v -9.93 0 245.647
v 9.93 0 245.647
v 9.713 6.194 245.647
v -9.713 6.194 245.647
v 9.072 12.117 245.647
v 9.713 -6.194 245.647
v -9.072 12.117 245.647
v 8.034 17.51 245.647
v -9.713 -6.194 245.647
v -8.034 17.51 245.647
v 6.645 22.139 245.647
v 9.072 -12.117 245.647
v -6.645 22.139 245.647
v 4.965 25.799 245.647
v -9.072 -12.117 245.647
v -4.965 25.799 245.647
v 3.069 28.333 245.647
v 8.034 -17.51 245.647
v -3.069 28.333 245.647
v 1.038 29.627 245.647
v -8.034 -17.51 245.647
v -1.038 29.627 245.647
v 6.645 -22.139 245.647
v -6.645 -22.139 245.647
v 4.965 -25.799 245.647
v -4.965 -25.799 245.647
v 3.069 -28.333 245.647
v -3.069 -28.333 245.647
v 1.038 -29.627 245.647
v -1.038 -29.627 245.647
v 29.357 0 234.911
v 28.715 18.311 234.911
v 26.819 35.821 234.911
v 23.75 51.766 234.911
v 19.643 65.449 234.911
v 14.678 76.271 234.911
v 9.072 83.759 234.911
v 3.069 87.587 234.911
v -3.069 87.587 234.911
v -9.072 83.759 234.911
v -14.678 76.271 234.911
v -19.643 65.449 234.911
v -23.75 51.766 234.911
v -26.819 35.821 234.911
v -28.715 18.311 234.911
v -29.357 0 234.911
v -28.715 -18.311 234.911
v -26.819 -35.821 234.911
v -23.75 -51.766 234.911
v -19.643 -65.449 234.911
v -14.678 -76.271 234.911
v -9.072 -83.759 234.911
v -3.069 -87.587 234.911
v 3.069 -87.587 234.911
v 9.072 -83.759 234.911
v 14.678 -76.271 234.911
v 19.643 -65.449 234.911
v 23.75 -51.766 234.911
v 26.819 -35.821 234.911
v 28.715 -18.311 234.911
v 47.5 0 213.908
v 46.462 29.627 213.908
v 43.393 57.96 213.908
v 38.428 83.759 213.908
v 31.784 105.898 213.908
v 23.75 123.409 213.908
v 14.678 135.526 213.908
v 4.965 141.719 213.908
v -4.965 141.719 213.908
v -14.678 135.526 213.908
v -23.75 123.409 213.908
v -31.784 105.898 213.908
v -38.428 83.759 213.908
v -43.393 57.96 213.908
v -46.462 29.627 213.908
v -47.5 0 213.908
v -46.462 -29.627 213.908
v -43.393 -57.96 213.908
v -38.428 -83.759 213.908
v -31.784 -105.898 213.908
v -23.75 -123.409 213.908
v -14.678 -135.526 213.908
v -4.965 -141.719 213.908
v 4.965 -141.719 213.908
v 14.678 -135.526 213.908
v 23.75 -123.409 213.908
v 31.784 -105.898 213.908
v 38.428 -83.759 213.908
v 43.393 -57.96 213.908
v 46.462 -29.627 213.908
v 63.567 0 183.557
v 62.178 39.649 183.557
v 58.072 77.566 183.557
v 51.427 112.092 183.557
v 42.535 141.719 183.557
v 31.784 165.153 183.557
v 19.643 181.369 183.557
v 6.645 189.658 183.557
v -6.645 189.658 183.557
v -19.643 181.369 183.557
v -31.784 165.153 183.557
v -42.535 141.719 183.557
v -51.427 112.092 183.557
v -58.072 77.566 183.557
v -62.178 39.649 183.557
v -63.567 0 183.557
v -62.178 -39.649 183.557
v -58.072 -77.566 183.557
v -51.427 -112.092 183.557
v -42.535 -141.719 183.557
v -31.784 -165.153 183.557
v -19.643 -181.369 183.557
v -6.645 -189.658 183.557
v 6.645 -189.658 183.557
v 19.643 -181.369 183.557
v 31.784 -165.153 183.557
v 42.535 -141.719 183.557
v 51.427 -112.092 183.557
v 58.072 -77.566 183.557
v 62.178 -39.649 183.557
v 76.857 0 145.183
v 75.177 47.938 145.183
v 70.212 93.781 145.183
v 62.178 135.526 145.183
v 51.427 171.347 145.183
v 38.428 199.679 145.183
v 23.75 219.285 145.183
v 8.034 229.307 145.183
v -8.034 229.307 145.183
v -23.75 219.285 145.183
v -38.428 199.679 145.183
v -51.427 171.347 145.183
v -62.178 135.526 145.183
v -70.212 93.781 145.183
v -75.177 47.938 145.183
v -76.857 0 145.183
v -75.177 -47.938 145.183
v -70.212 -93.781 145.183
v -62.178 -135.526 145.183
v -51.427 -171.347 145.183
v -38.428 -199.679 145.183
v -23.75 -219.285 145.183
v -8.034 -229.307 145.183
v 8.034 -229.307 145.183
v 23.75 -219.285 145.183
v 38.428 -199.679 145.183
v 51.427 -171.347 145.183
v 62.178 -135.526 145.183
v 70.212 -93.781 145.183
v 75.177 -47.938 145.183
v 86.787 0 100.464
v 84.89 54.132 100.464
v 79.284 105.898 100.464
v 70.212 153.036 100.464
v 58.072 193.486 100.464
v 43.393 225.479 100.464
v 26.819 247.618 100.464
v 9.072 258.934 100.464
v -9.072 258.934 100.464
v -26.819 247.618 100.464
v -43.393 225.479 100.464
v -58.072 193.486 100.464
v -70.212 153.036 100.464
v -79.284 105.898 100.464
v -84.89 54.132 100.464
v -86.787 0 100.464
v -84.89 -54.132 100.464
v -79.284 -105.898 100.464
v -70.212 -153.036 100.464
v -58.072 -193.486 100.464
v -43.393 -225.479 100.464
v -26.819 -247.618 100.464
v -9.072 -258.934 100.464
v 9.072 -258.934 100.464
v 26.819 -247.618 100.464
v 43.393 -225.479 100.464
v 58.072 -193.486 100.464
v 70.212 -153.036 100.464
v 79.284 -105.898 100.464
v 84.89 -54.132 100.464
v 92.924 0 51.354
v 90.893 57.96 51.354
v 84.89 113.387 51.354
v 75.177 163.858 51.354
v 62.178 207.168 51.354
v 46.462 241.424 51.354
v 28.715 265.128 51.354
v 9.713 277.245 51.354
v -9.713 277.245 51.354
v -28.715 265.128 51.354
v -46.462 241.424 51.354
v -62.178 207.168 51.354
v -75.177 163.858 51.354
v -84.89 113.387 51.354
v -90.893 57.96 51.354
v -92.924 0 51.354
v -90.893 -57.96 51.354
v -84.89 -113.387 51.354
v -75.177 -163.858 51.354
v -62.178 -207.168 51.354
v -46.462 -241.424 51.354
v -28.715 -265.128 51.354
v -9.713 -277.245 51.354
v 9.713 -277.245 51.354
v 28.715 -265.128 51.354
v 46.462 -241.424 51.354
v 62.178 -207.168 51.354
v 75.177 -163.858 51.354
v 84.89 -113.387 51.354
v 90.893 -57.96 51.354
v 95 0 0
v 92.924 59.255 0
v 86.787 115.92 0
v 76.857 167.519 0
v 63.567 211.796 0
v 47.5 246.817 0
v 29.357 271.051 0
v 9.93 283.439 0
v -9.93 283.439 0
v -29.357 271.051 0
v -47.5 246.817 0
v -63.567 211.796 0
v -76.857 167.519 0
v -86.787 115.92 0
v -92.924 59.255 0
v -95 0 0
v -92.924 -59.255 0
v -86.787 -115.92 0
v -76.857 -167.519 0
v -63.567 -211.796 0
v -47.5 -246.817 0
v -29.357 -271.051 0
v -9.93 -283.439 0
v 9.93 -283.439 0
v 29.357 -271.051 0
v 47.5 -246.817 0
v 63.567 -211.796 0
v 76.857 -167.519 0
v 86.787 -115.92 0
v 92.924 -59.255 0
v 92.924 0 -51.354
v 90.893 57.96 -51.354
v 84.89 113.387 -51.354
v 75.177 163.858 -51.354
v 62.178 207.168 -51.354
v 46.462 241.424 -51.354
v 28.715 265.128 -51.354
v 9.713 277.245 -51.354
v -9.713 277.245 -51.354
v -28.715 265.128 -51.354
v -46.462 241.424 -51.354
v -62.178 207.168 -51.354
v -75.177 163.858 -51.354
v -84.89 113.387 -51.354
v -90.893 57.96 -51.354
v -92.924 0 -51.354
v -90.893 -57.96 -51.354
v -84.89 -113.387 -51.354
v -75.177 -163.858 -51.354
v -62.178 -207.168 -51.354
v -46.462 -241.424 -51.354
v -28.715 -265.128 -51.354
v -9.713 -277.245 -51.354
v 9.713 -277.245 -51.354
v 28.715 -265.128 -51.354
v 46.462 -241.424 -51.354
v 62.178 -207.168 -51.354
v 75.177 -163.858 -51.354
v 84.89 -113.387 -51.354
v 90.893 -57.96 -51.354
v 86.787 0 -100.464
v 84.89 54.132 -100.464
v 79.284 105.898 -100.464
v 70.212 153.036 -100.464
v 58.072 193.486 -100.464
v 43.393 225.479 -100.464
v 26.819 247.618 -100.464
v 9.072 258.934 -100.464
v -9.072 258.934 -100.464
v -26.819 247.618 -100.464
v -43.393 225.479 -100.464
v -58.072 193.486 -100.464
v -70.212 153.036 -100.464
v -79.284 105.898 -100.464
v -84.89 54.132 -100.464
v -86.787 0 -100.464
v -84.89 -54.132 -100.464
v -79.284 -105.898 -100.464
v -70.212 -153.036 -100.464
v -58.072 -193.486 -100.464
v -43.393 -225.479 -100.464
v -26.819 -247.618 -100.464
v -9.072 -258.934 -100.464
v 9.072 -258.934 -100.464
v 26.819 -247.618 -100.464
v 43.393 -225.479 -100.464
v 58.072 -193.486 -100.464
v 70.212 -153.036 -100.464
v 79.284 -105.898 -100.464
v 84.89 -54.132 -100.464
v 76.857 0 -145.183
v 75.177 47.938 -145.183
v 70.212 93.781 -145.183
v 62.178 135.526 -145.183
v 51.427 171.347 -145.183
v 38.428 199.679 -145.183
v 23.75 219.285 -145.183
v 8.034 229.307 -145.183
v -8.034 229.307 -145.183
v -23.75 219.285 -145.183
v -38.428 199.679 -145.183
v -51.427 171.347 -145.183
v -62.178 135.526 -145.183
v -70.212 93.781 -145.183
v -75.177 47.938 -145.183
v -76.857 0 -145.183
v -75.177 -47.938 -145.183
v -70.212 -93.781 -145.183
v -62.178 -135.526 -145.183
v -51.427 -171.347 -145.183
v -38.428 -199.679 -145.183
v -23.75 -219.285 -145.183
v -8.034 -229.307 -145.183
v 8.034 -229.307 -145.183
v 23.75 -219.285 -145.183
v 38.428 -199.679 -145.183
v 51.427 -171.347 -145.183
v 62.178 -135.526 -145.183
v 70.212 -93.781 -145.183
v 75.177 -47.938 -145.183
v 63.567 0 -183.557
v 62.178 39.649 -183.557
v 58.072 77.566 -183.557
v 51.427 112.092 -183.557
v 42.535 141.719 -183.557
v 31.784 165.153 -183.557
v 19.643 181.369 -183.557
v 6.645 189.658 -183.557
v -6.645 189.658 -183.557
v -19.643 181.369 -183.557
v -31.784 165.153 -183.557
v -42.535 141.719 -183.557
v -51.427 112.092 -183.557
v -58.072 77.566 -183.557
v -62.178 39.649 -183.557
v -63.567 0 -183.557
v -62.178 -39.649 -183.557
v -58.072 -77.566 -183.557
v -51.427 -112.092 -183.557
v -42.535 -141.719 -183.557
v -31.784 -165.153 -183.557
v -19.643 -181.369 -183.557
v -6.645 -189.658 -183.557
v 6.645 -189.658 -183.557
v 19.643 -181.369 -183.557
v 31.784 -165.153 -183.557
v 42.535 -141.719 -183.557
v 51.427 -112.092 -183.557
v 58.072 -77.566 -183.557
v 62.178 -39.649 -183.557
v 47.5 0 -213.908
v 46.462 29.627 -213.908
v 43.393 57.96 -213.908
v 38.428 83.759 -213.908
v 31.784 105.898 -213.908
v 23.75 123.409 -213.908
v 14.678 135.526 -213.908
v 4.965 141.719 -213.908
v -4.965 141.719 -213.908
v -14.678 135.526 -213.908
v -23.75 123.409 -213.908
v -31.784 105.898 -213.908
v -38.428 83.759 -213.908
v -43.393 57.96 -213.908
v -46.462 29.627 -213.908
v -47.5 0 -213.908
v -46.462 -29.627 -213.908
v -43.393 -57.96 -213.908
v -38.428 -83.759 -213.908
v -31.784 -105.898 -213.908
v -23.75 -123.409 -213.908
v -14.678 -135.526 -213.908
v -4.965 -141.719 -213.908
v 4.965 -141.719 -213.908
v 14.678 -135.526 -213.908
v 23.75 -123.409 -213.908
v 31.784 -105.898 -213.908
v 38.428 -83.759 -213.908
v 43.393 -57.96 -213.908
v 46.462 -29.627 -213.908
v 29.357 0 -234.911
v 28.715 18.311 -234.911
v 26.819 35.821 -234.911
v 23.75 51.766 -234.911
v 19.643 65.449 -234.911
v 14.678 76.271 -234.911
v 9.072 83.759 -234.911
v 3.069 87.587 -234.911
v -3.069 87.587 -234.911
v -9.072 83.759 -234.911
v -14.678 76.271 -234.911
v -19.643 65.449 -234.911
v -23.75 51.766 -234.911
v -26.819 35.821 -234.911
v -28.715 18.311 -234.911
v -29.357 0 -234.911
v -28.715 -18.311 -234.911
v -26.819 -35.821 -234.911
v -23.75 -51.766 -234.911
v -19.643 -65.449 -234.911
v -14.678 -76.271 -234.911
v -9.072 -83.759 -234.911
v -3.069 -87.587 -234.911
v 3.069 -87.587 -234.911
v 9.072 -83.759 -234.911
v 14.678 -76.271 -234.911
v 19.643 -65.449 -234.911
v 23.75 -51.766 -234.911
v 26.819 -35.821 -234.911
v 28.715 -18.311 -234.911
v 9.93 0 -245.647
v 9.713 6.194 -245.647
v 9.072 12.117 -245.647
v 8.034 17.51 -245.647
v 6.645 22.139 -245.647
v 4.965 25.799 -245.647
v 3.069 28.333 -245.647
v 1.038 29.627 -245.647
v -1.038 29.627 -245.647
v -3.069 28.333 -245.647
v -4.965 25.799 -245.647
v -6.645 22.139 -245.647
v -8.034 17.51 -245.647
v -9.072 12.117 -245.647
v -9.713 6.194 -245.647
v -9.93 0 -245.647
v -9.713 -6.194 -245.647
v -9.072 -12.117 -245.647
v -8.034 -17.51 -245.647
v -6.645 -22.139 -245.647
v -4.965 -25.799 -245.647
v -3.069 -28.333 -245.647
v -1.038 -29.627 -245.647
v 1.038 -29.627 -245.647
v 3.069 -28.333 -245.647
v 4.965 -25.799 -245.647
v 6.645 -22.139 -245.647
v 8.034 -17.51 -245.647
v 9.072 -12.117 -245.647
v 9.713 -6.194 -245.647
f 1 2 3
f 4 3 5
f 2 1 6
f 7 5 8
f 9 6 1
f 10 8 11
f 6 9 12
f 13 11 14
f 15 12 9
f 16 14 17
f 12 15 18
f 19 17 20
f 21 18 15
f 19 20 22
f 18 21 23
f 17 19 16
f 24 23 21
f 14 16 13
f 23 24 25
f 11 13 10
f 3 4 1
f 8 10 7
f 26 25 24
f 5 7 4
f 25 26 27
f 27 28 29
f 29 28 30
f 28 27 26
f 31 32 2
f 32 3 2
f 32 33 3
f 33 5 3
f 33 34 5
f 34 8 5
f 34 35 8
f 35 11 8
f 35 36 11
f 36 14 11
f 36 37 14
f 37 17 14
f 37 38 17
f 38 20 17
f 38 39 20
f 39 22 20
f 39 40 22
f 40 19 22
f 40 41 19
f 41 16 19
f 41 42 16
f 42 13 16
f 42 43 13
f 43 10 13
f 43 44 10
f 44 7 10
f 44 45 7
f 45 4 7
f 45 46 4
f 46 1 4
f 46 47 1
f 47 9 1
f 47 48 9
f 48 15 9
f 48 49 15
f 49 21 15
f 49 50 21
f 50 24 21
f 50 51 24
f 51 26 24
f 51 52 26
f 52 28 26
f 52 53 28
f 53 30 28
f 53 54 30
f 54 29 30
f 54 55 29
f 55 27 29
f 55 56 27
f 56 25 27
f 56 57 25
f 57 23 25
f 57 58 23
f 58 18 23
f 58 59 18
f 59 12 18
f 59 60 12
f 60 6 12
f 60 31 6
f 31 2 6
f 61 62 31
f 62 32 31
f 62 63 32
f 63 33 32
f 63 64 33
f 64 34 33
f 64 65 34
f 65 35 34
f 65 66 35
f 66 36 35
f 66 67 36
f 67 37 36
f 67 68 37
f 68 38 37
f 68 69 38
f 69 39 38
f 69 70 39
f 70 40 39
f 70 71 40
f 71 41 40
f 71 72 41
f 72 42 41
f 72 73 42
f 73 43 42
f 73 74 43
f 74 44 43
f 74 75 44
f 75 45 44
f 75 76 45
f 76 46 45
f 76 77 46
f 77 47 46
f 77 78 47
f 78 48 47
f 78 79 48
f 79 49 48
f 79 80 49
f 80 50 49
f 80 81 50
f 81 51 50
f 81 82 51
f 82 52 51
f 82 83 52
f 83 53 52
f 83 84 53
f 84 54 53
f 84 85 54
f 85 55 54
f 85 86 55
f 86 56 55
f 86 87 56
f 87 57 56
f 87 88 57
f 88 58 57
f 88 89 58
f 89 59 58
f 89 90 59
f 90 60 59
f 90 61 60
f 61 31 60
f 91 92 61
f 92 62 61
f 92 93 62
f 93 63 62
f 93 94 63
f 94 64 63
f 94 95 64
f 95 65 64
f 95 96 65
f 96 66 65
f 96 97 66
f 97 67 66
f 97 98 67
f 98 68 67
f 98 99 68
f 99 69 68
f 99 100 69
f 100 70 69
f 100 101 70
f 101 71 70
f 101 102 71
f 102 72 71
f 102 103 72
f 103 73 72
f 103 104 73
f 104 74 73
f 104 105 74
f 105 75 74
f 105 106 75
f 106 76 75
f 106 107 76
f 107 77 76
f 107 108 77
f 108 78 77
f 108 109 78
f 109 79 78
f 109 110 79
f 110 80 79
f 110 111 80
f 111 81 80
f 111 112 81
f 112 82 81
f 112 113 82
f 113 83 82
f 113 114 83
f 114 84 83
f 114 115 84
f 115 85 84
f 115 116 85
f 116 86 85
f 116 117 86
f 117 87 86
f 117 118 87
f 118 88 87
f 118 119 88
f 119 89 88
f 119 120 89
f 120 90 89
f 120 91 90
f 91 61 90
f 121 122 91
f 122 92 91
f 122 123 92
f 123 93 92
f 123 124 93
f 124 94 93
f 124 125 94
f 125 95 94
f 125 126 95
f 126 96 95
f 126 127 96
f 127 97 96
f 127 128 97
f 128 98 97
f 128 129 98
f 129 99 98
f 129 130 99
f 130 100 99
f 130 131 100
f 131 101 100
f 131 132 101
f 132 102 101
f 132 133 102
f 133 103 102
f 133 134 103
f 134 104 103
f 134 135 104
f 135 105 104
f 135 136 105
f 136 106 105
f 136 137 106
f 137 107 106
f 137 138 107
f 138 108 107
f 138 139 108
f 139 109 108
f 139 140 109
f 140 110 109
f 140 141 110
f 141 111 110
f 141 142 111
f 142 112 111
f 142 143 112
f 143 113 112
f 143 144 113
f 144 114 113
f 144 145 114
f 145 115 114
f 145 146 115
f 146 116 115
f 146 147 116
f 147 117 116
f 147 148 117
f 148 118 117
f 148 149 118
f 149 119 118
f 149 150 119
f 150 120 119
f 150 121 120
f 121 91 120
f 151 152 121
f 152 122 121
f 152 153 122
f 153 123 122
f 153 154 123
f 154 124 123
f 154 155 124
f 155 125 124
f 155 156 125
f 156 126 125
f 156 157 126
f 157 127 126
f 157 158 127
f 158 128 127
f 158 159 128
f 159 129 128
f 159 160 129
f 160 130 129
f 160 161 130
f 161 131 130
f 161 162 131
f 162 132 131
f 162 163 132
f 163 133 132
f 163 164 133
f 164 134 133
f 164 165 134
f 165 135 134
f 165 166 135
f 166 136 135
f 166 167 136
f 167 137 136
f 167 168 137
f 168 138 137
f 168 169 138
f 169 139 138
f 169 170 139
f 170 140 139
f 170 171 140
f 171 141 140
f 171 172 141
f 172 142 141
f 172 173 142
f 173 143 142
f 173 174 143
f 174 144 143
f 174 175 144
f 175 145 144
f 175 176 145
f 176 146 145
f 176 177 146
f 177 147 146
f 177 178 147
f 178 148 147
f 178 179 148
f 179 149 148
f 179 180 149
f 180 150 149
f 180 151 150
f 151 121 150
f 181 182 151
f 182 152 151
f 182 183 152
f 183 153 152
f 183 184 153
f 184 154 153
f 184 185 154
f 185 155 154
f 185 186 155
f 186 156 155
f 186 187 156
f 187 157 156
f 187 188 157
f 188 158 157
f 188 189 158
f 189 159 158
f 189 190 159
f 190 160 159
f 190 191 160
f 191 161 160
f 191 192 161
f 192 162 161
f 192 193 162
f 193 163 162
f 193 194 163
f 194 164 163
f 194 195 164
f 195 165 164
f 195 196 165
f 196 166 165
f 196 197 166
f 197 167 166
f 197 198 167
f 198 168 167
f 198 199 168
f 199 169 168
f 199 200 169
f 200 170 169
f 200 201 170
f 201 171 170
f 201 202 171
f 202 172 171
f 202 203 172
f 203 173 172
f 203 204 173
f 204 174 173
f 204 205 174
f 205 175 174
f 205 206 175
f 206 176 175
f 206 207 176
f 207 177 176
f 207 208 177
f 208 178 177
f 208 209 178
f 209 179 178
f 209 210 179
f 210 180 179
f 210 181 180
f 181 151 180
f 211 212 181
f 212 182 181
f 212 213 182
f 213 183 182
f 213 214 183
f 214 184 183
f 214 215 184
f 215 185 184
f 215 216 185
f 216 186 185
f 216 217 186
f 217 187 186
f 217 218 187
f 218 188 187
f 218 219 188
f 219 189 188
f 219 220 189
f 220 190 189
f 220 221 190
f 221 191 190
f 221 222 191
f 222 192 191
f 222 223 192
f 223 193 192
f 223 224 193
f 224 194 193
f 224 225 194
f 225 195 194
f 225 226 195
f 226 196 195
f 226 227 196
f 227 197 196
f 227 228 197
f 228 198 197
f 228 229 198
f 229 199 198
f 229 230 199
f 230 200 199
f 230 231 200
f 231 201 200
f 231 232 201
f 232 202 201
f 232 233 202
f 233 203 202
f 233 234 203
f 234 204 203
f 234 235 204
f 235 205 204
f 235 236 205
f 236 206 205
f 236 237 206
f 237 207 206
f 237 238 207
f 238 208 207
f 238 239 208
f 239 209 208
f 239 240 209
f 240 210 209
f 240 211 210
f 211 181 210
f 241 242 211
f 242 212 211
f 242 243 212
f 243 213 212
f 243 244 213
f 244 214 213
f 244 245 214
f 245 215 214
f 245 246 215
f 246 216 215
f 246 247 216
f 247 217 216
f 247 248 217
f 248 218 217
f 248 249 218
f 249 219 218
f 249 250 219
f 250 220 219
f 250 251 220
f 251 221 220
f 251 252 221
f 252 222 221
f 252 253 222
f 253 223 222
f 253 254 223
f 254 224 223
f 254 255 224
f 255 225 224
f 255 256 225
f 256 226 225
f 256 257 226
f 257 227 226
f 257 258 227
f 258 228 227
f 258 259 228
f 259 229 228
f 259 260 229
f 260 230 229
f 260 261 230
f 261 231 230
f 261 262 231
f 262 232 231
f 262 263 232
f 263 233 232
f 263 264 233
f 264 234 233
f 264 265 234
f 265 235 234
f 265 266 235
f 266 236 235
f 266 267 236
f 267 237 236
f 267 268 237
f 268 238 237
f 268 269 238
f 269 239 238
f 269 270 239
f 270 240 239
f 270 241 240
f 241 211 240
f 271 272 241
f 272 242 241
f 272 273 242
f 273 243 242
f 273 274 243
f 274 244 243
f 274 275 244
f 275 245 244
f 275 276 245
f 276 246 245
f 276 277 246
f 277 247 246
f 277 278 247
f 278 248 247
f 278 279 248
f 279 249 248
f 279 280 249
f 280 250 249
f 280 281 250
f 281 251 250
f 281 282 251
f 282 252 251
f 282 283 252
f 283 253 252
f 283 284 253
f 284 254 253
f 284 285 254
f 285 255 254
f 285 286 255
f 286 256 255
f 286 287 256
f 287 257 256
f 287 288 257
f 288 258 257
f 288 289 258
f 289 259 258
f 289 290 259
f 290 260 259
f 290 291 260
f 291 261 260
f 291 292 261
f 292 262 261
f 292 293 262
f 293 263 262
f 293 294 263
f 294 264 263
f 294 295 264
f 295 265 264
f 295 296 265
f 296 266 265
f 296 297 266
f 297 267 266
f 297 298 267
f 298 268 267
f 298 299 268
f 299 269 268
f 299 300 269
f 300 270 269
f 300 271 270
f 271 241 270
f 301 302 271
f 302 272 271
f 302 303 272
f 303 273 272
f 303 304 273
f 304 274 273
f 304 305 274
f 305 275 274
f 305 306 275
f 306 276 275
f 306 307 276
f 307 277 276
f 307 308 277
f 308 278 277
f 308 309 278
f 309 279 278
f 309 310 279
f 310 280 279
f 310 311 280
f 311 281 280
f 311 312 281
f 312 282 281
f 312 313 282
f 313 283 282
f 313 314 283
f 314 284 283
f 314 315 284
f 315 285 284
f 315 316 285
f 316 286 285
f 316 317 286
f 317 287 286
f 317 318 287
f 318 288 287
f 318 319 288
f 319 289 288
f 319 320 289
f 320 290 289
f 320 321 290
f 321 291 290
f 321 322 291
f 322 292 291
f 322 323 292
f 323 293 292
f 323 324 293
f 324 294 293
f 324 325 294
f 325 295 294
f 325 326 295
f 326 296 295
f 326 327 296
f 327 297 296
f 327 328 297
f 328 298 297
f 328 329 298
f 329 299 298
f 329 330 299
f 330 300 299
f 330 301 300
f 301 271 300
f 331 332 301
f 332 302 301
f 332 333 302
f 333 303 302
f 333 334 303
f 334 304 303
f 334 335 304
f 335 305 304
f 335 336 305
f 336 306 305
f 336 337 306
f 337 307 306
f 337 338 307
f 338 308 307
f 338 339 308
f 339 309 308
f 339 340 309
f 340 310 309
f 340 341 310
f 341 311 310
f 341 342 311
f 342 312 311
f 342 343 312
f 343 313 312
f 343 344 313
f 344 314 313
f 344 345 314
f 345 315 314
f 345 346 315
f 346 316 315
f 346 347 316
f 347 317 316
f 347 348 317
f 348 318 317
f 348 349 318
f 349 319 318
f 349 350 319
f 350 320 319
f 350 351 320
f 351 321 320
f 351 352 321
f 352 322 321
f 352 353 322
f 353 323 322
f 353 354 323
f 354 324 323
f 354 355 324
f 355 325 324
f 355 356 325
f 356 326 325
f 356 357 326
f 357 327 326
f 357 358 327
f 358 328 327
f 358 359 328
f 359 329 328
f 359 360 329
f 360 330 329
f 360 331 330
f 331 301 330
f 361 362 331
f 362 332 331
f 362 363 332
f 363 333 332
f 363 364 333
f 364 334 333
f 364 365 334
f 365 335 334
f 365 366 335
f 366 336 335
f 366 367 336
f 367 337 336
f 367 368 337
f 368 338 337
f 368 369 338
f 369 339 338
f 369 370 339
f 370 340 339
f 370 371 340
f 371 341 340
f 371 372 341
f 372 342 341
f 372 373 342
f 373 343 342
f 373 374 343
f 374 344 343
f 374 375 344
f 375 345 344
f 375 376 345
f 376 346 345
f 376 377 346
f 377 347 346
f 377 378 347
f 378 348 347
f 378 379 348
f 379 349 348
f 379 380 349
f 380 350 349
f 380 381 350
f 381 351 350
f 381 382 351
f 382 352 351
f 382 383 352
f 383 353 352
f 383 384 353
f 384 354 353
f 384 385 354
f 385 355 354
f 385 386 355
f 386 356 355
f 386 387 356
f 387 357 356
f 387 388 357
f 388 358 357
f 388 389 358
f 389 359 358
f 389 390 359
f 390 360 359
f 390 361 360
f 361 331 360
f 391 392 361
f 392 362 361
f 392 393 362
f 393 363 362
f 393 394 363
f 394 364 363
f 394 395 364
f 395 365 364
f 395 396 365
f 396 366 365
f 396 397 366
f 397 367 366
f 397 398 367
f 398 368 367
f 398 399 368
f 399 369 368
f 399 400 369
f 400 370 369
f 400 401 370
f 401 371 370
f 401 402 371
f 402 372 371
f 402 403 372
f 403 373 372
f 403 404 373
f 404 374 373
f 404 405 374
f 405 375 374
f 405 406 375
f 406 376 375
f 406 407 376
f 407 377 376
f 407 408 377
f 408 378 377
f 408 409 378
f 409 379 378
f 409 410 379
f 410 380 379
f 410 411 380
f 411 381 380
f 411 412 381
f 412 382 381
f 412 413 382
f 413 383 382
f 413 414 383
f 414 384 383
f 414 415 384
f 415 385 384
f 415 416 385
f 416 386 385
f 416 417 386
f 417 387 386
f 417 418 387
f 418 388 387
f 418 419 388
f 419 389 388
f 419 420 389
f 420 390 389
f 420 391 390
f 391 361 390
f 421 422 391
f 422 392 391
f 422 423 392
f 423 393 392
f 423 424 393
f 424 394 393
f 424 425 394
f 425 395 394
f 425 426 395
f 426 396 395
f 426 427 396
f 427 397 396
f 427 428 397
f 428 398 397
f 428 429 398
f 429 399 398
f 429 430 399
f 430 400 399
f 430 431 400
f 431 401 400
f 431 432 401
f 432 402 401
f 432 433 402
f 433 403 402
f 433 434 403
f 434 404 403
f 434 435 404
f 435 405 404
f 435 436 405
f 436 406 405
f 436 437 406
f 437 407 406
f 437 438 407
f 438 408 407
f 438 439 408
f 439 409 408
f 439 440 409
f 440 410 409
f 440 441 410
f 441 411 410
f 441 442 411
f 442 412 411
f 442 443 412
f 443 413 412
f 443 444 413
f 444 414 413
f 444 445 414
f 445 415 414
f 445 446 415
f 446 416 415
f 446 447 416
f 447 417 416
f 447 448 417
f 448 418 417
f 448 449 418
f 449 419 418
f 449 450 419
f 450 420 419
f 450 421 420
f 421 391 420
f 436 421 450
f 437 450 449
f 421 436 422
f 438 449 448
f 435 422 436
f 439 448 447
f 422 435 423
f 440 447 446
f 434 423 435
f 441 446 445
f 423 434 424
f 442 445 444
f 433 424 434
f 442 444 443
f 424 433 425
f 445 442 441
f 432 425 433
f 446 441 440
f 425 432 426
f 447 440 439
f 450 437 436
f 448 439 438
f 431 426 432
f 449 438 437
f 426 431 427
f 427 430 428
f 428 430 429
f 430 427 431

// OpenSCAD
// Generated by SolidPython 1.0.1 on 2020-07-29 00:46:46


scale(v = [5, 15, 13]) {
	sphere(r = 19);
}
/***********************************************
*********      SolidPython code:      **********
************************************************
 
# import packages: SolidPython
from solid import *
from solid.utils import *
from itertools import chain, combinations, permutations


class Resize:

    def __init__(self, scad_file):
        self.scad_file = scad_file
        #self.scad_file = import_scad(scad_file)
        # cone/cylinder param:
        self.r1 = 0
        self.r2 = 0
        self.h = 0
        # rectangular prism param:
        self.w = 0
        self.l = 0
        # ellipse param:
        self.r = 0

    # import OpenScad code (file name corresponds to shape)


    # classify shape + parameters
    def assign(self, param1, param2, param3):
        if self.scad_file == 'cone.scad':
            self.r1 = param1
            self.r2 = param2
            self.h = param3
        elif self.scad_file == 'cylinder.scad':
            self.r1 = param1
            self.r2 = param2
            self.h = param3
        elif self.scad_file == 'rectangularPrism.scad':
            self.h = param1
            self.l = param2
            self.w = param3
        else:
            self.r = param1
            self.h = param2

    # resize parameters
    def iterate(self):
        x = range(3, 20, 2)
        i = 1
        if self.scad_file == 'cone.scad':
            tempList = list(permutations(x, 2))
            for temp in tempList:
                param1 = temp[0]
                param2 = temp[1]
                filepath = 'produced_scad_files/' + 'cone' + str(param1) + '_' + str(param2) + '_' + '.scad'
                scad_render_to_file(cylinder(h=param1, r1=param2, r2=0), filepath)

        elif self.scad_file == 'cylinder.scad':
            tempList = list(permutations(x, 3))
            for temp in tempList:
                param1 = temp[0]
                param2 = temp[1]
                filepath = 'produced_scad_files/' + 'cylinder' + str(param1) + '_' + str(param2) + '_' + '.scad'
                scad_render_to_file(cylinder(h=param1, r1=param2, r2=param2), filepath)

        elif self.scad_file == 'rectangularPrism.scad':
            tempList = list(permutations(x, 3))
            for temp in tempList:
                param1 = temp[0]
                param2 = temp[1]
                param3 = temp[2]
                filepath = 'produced_scad_files/' + 'rectangularPrism' + str(param1) + '_' + str(param2) + '_' + str(
                    param3) + '.scad'
                scad_render_to_file(cube(size=(param1, param2, param3)), filepath)

        elif self.scad_file == 'ellipse.scad':
            tempList = list(permutations(x, 4))
            for temp in tempList:
                param1 = temp[0]
                param2 = temp[1]
                param3 = temp[2]
                param4 = temp[3]
                filepath = 'produced_scad_files/' + 'ellipse' + str(param1) + '_' + str(param2) + '_' + str(param3) + '_' + str(param4) + '.scad'
                scad_render_to_file(scale([param1, param2, param3])(sphere(r=param4)), filepath)

    def render_to_scadfile(self):
        scad_render_to_file(scad, 'example.scad') 
 
************************************************/
